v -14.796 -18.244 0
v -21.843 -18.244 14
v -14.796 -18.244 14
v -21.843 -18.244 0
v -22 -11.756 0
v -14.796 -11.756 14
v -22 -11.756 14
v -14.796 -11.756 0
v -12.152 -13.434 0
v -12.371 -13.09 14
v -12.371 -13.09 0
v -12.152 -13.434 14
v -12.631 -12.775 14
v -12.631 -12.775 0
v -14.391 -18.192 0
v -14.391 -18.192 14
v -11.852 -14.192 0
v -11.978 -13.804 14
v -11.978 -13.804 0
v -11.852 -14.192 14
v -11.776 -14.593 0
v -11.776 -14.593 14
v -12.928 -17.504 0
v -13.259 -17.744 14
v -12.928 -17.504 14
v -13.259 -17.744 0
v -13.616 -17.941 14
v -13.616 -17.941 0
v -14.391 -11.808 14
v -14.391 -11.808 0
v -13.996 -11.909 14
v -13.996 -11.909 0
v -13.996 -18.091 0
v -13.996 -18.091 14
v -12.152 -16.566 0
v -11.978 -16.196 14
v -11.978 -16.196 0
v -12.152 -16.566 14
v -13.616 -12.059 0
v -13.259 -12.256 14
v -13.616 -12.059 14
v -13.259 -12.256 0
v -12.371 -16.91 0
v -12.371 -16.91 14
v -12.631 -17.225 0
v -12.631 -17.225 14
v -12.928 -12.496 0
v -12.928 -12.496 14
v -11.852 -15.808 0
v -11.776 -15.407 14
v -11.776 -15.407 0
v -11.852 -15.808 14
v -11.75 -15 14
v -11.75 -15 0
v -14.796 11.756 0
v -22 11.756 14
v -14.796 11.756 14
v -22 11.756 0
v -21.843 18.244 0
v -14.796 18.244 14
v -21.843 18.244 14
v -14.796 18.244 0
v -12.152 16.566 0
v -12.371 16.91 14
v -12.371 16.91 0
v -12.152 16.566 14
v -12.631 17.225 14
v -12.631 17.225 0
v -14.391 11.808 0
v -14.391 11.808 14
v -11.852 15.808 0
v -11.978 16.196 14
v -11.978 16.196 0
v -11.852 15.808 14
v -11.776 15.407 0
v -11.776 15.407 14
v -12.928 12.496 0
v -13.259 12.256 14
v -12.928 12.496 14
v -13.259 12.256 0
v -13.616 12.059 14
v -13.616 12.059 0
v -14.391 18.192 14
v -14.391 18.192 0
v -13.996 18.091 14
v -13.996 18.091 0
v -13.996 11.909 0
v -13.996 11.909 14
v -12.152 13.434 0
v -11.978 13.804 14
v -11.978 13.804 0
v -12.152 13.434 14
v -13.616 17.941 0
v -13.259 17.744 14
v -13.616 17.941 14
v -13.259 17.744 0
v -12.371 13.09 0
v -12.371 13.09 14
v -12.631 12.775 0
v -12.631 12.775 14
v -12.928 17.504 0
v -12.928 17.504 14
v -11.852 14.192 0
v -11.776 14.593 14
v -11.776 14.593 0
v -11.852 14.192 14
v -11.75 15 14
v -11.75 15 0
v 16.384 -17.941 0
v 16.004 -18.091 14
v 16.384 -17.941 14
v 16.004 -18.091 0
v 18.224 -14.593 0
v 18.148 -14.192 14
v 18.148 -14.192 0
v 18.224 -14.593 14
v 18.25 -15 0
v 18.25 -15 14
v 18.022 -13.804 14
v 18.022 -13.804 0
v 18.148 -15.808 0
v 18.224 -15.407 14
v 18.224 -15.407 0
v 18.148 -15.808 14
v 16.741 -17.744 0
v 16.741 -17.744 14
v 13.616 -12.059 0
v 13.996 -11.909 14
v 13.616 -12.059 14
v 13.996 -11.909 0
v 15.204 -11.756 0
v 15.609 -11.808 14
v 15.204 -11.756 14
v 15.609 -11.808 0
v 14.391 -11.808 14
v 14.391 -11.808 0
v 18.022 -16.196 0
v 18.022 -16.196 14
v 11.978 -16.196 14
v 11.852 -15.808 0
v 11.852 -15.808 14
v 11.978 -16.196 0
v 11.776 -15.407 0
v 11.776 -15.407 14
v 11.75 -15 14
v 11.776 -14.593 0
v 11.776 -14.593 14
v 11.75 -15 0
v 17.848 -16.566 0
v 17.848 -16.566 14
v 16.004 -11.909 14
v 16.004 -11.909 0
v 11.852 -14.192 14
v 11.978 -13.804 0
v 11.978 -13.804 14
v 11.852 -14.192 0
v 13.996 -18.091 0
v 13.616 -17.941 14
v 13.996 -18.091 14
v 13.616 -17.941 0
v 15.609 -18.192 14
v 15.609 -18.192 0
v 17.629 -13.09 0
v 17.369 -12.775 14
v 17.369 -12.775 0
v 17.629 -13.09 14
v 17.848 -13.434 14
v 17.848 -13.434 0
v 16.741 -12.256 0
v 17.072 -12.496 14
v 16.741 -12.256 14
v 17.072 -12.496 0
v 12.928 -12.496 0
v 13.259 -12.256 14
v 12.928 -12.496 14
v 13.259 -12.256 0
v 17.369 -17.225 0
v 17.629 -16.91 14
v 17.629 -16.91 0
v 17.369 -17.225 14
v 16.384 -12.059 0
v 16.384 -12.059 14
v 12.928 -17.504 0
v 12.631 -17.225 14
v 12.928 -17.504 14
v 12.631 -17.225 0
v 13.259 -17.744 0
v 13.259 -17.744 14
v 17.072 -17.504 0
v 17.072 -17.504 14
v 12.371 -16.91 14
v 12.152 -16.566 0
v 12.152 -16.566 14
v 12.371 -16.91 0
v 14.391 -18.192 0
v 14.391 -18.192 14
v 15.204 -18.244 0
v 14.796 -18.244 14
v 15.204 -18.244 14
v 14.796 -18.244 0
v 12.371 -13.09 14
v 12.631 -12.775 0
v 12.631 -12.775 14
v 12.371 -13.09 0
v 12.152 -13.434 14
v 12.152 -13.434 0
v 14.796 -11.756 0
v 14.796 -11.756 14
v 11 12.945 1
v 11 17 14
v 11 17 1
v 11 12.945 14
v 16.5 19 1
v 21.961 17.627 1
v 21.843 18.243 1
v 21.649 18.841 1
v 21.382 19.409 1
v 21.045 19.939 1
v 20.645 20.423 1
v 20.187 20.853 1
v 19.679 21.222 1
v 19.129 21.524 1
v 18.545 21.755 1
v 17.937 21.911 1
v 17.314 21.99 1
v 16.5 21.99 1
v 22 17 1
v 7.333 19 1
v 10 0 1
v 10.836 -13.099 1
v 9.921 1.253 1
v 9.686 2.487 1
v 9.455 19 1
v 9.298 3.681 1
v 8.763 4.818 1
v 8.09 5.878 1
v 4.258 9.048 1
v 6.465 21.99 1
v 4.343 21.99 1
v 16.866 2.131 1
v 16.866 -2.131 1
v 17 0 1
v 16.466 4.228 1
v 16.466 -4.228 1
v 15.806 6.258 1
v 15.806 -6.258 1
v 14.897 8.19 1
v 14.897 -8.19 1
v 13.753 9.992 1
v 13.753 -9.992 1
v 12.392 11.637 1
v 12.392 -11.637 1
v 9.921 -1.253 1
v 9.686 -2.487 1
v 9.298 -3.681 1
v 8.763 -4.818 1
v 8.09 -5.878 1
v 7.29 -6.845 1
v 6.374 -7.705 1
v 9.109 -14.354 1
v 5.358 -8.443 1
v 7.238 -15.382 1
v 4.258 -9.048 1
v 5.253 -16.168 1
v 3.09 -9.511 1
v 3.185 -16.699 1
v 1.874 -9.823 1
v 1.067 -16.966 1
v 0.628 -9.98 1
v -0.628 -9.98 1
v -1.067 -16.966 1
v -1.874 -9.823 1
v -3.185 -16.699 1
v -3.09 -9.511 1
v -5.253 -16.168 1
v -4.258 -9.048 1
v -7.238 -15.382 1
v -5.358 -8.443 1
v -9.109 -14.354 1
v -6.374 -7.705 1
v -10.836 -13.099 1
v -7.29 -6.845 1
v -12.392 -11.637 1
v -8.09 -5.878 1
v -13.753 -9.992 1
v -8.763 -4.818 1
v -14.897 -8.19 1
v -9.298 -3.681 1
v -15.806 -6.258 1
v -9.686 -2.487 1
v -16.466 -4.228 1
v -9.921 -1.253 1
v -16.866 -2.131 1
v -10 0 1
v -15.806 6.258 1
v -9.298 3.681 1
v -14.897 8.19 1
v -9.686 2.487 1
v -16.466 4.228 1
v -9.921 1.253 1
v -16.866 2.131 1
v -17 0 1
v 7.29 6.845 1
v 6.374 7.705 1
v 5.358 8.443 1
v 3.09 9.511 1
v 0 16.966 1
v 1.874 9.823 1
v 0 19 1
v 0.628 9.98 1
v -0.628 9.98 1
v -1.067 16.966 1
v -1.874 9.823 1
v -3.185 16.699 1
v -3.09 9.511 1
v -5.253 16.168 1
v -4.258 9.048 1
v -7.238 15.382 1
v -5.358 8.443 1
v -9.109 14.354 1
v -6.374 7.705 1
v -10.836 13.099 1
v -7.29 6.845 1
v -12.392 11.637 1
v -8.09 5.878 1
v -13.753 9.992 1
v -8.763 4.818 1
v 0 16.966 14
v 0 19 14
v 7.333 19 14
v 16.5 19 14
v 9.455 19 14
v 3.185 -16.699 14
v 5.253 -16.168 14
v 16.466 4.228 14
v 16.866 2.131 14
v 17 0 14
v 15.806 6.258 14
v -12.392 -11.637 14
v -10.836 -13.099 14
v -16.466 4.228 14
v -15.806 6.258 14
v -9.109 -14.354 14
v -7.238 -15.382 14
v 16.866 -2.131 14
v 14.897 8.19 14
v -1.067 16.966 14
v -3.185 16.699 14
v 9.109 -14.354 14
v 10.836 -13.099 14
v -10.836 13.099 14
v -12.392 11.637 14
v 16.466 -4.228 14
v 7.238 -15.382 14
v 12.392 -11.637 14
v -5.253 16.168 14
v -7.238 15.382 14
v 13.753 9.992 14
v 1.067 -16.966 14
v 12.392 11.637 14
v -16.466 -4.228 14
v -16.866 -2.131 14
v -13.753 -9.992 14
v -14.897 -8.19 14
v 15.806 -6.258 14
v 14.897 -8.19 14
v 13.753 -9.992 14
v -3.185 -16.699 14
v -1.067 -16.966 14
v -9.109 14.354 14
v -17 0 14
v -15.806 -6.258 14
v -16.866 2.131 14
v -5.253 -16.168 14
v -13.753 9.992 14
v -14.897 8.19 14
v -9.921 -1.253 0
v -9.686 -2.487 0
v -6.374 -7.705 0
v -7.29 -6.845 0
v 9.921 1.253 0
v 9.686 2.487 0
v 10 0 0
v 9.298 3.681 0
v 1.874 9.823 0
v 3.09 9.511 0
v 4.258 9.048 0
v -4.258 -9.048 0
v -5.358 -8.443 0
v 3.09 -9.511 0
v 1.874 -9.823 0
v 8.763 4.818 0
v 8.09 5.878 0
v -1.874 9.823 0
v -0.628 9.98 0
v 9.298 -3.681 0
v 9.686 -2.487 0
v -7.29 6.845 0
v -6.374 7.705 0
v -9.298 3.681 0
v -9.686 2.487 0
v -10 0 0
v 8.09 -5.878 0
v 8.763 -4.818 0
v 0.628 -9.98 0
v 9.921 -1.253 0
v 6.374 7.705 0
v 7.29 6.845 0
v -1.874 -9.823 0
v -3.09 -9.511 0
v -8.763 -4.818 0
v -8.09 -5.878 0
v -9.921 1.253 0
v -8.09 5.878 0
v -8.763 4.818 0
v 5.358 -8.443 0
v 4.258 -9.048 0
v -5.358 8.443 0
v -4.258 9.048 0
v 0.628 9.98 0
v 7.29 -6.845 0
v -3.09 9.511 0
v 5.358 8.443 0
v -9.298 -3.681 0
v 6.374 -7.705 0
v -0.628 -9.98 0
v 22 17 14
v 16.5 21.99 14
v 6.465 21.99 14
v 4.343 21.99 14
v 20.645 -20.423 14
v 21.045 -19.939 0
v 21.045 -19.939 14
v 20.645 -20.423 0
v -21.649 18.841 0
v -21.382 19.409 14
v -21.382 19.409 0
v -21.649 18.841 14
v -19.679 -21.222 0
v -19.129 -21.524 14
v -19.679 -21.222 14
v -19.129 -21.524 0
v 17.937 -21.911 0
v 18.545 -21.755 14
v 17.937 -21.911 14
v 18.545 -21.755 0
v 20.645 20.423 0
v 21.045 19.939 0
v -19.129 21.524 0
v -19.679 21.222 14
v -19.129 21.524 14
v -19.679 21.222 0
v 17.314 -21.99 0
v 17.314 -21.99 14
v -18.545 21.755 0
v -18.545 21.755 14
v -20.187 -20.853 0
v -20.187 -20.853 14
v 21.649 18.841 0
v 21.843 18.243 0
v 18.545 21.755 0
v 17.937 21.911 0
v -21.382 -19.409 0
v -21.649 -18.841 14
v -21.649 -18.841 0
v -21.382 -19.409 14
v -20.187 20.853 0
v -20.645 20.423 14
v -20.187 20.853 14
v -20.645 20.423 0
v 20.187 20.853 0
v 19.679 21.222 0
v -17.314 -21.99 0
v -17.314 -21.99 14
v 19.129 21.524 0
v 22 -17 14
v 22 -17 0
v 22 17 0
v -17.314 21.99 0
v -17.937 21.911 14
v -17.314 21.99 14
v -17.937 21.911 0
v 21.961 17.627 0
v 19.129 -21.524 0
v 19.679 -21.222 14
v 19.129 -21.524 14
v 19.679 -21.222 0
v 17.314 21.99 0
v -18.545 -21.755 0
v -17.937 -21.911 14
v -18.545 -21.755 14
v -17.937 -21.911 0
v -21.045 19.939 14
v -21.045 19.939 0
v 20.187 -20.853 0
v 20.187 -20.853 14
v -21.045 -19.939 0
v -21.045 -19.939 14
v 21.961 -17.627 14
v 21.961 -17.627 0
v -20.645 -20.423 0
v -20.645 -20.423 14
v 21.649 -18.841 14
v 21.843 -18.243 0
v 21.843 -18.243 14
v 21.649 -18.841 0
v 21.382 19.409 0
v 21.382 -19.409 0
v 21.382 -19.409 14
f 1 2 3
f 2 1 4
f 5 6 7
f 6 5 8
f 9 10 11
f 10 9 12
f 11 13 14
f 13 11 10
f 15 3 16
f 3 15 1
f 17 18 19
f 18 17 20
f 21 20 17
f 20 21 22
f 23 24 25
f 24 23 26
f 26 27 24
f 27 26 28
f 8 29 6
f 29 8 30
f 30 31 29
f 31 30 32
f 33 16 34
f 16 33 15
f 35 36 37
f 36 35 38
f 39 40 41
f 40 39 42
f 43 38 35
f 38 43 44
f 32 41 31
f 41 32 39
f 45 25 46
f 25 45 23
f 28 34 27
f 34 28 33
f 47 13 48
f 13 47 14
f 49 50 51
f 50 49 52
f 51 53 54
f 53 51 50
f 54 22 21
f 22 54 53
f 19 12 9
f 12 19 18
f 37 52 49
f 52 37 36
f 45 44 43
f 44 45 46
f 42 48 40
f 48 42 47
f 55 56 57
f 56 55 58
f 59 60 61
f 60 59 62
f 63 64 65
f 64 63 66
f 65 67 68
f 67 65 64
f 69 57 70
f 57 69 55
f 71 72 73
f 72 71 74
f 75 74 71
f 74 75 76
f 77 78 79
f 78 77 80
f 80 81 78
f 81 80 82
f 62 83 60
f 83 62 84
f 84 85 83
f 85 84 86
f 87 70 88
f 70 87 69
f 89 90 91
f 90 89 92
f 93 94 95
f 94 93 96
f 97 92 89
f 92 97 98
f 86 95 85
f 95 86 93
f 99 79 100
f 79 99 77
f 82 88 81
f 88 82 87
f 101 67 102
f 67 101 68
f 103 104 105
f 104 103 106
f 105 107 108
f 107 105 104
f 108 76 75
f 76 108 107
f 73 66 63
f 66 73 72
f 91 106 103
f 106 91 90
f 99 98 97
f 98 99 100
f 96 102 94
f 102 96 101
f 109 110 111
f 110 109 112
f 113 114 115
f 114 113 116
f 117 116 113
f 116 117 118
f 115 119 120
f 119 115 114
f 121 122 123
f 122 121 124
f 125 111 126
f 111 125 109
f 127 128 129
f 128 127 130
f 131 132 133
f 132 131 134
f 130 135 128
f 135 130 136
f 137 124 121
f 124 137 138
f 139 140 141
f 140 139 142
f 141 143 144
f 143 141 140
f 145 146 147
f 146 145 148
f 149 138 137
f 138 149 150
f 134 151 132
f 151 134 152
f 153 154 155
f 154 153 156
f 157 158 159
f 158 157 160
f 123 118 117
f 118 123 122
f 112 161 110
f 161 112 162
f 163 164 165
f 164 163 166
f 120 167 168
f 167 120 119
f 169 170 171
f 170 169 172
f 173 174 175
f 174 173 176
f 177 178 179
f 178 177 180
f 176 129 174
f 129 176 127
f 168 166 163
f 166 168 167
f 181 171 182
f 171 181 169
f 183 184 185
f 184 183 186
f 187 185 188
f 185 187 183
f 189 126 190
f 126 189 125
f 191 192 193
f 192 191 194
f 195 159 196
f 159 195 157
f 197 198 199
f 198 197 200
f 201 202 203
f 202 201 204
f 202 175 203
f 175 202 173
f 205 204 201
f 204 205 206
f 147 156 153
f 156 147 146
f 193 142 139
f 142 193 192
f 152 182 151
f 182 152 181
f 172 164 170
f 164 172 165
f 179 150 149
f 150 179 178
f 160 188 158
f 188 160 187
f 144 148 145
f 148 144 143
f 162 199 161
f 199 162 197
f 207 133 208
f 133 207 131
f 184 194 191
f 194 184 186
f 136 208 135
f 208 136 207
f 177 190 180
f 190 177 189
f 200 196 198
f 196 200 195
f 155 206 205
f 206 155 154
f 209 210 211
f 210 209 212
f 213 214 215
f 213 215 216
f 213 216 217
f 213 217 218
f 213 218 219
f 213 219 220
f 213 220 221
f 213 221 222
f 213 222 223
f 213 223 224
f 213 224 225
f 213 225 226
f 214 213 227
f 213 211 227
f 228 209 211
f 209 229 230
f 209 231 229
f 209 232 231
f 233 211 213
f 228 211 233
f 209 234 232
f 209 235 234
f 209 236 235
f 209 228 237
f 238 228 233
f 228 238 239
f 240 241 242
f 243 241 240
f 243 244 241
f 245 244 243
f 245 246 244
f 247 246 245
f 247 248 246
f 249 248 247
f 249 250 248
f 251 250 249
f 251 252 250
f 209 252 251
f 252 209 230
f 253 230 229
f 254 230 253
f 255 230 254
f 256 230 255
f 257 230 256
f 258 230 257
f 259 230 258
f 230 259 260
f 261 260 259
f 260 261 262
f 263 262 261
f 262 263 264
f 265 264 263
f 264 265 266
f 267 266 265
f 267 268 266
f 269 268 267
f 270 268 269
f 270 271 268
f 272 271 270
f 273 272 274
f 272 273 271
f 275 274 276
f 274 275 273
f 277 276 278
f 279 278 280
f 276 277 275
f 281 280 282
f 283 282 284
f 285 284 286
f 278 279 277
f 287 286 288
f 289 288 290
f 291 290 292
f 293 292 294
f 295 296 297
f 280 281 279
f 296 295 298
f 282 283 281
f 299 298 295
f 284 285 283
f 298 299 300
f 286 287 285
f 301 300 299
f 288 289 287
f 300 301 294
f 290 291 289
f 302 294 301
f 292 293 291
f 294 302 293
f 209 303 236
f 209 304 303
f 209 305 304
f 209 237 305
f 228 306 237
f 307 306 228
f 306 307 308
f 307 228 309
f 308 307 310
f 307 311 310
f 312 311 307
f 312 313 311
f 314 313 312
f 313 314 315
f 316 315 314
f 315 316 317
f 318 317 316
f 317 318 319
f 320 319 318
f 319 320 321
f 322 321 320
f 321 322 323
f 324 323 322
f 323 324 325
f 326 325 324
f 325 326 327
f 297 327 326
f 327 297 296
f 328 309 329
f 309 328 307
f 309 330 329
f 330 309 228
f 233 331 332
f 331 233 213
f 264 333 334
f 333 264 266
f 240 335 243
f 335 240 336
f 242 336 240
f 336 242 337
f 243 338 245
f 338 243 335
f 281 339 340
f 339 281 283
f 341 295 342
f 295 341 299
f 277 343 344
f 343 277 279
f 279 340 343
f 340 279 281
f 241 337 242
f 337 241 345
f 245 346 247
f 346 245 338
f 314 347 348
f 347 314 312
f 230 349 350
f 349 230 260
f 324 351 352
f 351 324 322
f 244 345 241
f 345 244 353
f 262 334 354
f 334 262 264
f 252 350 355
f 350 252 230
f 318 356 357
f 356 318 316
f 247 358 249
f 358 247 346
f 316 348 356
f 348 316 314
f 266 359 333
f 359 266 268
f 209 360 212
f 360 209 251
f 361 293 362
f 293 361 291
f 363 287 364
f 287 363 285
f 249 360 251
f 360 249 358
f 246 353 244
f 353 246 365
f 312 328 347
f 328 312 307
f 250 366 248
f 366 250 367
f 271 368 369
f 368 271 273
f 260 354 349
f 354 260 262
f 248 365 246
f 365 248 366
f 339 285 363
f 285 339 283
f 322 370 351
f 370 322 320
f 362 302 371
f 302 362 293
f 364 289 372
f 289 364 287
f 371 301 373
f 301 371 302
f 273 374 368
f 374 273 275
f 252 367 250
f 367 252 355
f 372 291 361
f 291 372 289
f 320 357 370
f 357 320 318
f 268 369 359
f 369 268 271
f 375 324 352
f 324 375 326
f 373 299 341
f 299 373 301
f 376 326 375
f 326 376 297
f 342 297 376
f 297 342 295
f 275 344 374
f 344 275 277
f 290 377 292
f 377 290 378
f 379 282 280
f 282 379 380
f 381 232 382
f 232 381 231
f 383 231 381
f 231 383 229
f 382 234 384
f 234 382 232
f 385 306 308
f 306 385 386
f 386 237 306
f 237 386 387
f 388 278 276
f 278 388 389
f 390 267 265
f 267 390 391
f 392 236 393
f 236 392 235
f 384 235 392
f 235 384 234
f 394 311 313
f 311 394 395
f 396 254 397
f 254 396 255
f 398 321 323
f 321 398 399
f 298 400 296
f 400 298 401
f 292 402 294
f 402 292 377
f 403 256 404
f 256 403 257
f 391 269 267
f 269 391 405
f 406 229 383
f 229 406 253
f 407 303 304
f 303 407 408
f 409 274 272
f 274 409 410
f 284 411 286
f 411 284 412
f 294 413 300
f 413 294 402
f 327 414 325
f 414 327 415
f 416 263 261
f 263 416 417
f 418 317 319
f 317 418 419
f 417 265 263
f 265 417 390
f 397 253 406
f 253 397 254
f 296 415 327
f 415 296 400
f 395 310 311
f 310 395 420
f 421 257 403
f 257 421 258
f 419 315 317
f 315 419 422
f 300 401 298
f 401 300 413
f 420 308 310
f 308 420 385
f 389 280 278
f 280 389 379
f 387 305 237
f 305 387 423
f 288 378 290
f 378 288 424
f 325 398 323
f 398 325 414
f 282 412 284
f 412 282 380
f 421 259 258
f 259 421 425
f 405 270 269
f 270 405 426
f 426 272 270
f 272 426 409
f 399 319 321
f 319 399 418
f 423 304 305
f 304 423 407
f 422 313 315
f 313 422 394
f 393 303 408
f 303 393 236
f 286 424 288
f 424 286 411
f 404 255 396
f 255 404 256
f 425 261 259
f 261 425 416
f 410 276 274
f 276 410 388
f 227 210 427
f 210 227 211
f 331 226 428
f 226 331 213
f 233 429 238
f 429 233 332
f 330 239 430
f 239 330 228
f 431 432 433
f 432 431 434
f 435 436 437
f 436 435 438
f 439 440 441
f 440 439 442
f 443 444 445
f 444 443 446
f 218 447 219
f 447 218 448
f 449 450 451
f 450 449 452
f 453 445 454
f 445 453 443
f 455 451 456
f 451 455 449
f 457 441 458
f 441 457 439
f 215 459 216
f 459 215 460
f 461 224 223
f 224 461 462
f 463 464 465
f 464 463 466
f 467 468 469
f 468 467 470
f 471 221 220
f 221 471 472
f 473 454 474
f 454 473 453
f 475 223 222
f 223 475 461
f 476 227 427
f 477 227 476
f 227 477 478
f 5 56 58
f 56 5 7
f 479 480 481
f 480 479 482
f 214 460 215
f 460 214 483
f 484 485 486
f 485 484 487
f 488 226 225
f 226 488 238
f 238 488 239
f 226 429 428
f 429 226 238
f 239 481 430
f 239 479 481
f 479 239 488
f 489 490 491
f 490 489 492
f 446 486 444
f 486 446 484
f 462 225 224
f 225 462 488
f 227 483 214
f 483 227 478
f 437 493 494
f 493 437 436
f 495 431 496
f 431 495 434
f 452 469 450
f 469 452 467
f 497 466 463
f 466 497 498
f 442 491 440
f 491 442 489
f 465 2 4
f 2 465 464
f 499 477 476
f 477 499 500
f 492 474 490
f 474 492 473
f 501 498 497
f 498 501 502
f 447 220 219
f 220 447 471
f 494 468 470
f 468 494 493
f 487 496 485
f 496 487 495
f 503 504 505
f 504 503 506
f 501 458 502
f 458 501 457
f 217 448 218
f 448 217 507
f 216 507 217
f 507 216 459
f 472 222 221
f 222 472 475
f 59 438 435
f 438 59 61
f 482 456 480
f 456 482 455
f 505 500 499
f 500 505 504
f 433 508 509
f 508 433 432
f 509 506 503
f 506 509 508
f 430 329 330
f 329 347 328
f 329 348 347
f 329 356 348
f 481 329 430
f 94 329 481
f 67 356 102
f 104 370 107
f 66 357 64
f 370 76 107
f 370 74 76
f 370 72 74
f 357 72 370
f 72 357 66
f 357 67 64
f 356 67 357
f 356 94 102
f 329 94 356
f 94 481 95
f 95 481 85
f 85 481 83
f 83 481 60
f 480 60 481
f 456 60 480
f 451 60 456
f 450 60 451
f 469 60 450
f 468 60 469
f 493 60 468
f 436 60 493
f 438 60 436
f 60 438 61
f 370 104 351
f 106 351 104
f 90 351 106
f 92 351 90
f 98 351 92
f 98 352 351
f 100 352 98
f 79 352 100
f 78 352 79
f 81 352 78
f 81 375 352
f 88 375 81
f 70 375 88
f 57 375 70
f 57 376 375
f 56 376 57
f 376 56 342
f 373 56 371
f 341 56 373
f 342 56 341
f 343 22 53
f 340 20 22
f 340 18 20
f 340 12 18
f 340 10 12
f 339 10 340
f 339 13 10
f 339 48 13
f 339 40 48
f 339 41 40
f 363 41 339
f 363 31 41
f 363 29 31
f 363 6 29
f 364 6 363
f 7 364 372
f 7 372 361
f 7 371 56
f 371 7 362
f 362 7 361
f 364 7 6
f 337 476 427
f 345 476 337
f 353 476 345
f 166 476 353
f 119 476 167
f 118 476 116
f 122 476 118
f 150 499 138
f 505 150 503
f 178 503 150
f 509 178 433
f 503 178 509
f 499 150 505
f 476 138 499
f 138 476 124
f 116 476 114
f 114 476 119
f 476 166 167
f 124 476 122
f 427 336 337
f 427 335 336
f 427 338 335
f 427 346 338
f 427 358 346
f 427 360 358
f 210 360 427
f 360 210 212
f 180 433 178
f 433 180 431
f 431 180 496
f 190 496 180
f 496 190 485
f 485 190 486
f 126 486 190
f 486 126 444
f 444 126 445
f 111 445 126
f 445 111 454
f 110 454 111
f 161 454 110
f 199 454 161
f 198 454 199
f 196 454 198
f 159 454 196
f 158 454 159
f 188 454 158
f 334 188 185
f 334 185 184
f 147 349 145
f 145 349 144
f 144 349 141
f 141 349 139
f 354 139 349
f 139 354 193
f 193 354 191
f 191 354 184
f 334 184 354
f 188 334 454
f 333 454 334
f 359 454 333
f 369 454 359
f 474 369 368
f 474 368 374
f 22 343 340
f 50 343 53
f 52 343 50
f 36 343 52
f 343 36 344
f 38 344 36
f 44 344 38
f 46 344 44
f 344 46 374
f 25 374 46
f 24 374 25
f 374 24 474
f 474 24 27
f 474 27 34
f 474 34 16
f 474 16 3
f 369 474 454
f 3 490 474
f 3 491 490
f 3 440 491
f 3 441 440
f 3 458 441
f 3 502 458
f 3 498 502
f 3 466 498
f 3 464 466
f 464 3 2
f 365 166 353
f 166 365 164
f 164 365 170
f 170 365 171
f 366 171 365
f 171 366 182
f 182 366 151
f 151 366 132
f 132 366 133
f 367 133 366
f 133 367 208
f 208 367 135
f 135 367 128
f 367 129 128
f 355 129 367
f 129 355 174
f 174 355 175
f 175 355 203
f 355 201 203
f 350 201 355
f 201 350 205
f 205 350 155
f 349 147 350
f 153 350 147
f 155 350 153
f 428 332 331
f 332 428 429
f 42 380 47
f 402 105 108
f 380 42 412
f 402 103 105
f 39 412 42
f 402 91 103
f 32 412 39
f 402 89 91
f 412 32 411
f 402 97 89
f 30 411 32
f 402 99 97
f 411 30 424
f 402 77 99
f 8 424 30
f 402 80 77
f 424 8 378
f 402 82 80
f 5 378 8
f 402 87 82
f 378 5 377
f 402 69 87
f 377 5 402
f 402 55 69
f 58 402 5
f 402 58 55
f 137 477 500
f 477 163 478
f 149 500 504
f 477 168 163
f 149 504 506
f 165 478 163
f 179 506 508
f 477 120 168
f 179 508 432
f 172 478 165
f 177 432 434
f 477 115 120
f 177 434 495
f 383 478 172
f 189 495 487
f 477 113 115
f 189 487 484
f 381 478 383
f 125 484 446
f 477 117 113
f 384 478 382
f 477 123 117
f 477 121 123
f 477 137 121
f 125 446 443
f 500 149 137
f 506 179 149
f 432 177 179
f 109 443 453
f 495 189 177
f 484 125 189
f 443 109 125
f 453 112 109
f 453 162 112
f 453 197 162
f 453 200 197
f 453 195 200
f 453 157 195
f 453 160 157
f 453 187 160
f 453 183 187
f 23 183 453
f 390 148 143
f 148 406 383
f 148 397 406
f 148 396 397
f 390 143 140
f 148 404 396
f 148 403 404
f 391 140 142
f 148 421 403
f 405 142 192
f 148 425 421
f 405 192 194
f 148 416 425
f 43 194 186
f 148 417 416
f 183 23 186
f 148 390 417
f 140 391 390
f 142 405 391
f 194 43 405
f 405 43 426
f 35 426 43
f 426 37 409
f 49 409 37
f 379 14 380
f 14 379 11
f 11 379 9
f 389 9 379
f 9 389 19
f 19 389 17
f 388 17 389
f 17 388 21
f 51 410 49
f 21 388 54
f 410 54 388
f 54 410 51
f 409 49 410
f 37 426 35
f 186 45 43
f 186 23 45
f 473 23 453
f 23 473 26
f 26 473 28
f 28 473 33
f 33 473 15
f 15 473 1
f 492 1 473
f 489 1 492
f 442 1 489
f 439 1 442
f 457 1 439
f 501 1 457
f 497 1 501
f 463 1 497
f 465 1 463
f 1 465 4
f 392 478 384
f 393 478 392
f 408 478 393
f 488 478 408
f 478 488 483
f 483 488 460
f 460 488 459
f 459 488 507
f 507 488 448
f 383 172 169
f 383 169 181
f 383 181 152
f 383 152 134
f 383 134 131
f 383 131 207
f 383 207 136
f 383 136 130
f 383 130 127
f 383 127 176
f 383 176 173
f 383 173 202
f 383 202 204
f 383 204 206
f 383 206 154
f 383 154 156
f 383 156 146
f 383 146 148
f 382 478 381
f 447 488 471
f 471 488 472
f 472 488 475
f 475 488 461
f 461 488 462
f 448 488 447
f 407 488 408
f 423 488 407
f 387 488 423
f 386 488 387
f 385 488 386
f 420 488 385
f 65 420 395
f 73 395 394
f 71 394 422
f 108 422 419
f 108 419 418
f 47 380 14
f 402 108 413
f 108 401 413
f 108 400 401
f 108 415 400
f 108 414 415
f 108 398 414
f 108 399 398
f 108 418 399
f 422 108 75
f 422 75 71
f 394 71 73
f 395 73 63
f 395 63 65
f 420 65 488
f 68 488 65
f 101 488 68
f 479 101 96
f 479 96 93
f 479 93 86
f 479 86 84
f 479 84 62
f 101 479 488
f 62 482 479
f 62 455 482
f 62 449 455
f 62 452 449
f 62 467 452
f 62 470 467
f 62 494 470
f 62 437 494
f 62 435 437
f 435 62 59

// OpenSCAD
$fn = 50;


difference() {
	union() {
		translate(v = [0, 0, 0]) {
			rotate(a = [0, 0, 0]) {
				hull() {
					translate(v = [-17.0000000000, 17.0000000000, 0]) {
						rotate(a = [0, 0, 0]) {
							translate(v = [0, 0, 0]) {
								rotate(a = [0, 0, 0]) {
									cylinder(h = 14, r = 5);
								}
							}
						}
					}
					translate(v = [17.0000000000, 17.0000000000, 0]) {
						rotate(a = [0, 0, 0]) {
							translate(v = [0, 0, 0]) {
								rotate(a = [0, 0, 0]) {
									cylinder(h = 14, r = 5);
								}
							}
						}
					}
					translate(v = [-17.0000000000, -17.0000000000, 0]) {
						rotate(a = [0, 0, 0]) {
							translate(v = [0, 0, 0]) {
								rotate(a = [0, 0, 0]) {
									cylinder(h = 14, r = 5);
								}
							}
						}
					}
					translate(v = [17.0000000000, -17.0000000000, 0]) {
						rotate(a = [0, 0, 0]) {
							translate(v = [0, 0, 0]) {
								rotate(a = [0, 0, 0]) {
									cylinder(h = 14, r = 5);
								}
							}
						}
					}
				}
			}
		}
	}
	union() {
		translate(v = [-22.5000000000, -15.0000000000, -125]) {
			rotate(a = [0, 0, 0]) {
				hull() {
					translate(v = [7.5000000000, 0, 0]) {
						rotate(a = [0, 0, 0]) {
							translate(v = [0, 0, 0]) {
								rotate(a = [0, 0, 0]) {
									cylinder(h = 250, r = 3.2500000000);
								}
							}
						}
					}
					translate(v = [-7.5000000000, 0, 0]) {
						rotate(a = [0, 0, 0]) {
							translate(v = [0, 0, 0]) {
								rotate(a = [0, 0, 0]) {
									cylinder(h = 250, r = 3.2500000000);
								}
							}
						}
					}
				}
			}
		}
		translate(v = [-22.5000000000, 15.0000000000, -125]) {
			rotate(a = [0, 0, 0]) {
				hull() {
					translate(v = [7.5000000000, 0, 0]) {
						rotate(a = [0, 0, 0]) {
							translate(v = [0, 0, 0]) {
								rotate(a = [0, 0, 0]) {
									cylinder(h = 250, r = 3.2500000000);
								}
							}
						}
					}
					translate(v = [-7.5000000000, 0, 0]) {
						rotate(a = [0, 0, 0]) {
							translate(v = [0, 0, 0]) {
								rotate(a = [0, 0, 0]) {
									cylinder(h = 250, r = 3.2500000000);
								}
							}
						}
					}
				}
			}
		}
		translate(v = [15.0000000000, -15.0000000000, -125.0000000000]) {
			rotate(a = [0, 0, 0]) {
				cylinder(h = 250, r = 3.2500000000);
			}
		}
		translate(v = [0.0000000000, 11.0000000000, 1.0000000000]) {
			rotate(a = [0, 0, 0]) {
				cube(size = [11, 8, 16]);
			}
		}
		translate(v = [0, 0, 1.0000000000]) {
			rotate(a = [0, 0, 0]) {
				cylinder(h = 16, r = 17.0000000000);
			}
		}
		translate(v = [0, 0, -7.0000000000]) {
			rotate(a = [0, 0, 0]) {
				cylinder(h = 14, r = 10.0000000000);
			}
		}
		translate(v = [0.0000000000, 17.0000000000, 1]) {
			rotate(a = [0, 0, 0]) {
				cube(size = [22.0000000000, 2, 16]);
			}
		}
		translate(v = [16.5000000000, 17.0000000000, 1]) {
			rotate(a = [0, 0, 0]) {
				cube(size = [5.5000000000, 5, 16]);
			}
		}
		translate(v = [3.5833333333, 22.7500000000, 1]) {
			rotate(a = [0, 0, -45]) {
				cube(size = [7.5000000000, 1.5000000000, 16]);
			}
		}
	}
}
